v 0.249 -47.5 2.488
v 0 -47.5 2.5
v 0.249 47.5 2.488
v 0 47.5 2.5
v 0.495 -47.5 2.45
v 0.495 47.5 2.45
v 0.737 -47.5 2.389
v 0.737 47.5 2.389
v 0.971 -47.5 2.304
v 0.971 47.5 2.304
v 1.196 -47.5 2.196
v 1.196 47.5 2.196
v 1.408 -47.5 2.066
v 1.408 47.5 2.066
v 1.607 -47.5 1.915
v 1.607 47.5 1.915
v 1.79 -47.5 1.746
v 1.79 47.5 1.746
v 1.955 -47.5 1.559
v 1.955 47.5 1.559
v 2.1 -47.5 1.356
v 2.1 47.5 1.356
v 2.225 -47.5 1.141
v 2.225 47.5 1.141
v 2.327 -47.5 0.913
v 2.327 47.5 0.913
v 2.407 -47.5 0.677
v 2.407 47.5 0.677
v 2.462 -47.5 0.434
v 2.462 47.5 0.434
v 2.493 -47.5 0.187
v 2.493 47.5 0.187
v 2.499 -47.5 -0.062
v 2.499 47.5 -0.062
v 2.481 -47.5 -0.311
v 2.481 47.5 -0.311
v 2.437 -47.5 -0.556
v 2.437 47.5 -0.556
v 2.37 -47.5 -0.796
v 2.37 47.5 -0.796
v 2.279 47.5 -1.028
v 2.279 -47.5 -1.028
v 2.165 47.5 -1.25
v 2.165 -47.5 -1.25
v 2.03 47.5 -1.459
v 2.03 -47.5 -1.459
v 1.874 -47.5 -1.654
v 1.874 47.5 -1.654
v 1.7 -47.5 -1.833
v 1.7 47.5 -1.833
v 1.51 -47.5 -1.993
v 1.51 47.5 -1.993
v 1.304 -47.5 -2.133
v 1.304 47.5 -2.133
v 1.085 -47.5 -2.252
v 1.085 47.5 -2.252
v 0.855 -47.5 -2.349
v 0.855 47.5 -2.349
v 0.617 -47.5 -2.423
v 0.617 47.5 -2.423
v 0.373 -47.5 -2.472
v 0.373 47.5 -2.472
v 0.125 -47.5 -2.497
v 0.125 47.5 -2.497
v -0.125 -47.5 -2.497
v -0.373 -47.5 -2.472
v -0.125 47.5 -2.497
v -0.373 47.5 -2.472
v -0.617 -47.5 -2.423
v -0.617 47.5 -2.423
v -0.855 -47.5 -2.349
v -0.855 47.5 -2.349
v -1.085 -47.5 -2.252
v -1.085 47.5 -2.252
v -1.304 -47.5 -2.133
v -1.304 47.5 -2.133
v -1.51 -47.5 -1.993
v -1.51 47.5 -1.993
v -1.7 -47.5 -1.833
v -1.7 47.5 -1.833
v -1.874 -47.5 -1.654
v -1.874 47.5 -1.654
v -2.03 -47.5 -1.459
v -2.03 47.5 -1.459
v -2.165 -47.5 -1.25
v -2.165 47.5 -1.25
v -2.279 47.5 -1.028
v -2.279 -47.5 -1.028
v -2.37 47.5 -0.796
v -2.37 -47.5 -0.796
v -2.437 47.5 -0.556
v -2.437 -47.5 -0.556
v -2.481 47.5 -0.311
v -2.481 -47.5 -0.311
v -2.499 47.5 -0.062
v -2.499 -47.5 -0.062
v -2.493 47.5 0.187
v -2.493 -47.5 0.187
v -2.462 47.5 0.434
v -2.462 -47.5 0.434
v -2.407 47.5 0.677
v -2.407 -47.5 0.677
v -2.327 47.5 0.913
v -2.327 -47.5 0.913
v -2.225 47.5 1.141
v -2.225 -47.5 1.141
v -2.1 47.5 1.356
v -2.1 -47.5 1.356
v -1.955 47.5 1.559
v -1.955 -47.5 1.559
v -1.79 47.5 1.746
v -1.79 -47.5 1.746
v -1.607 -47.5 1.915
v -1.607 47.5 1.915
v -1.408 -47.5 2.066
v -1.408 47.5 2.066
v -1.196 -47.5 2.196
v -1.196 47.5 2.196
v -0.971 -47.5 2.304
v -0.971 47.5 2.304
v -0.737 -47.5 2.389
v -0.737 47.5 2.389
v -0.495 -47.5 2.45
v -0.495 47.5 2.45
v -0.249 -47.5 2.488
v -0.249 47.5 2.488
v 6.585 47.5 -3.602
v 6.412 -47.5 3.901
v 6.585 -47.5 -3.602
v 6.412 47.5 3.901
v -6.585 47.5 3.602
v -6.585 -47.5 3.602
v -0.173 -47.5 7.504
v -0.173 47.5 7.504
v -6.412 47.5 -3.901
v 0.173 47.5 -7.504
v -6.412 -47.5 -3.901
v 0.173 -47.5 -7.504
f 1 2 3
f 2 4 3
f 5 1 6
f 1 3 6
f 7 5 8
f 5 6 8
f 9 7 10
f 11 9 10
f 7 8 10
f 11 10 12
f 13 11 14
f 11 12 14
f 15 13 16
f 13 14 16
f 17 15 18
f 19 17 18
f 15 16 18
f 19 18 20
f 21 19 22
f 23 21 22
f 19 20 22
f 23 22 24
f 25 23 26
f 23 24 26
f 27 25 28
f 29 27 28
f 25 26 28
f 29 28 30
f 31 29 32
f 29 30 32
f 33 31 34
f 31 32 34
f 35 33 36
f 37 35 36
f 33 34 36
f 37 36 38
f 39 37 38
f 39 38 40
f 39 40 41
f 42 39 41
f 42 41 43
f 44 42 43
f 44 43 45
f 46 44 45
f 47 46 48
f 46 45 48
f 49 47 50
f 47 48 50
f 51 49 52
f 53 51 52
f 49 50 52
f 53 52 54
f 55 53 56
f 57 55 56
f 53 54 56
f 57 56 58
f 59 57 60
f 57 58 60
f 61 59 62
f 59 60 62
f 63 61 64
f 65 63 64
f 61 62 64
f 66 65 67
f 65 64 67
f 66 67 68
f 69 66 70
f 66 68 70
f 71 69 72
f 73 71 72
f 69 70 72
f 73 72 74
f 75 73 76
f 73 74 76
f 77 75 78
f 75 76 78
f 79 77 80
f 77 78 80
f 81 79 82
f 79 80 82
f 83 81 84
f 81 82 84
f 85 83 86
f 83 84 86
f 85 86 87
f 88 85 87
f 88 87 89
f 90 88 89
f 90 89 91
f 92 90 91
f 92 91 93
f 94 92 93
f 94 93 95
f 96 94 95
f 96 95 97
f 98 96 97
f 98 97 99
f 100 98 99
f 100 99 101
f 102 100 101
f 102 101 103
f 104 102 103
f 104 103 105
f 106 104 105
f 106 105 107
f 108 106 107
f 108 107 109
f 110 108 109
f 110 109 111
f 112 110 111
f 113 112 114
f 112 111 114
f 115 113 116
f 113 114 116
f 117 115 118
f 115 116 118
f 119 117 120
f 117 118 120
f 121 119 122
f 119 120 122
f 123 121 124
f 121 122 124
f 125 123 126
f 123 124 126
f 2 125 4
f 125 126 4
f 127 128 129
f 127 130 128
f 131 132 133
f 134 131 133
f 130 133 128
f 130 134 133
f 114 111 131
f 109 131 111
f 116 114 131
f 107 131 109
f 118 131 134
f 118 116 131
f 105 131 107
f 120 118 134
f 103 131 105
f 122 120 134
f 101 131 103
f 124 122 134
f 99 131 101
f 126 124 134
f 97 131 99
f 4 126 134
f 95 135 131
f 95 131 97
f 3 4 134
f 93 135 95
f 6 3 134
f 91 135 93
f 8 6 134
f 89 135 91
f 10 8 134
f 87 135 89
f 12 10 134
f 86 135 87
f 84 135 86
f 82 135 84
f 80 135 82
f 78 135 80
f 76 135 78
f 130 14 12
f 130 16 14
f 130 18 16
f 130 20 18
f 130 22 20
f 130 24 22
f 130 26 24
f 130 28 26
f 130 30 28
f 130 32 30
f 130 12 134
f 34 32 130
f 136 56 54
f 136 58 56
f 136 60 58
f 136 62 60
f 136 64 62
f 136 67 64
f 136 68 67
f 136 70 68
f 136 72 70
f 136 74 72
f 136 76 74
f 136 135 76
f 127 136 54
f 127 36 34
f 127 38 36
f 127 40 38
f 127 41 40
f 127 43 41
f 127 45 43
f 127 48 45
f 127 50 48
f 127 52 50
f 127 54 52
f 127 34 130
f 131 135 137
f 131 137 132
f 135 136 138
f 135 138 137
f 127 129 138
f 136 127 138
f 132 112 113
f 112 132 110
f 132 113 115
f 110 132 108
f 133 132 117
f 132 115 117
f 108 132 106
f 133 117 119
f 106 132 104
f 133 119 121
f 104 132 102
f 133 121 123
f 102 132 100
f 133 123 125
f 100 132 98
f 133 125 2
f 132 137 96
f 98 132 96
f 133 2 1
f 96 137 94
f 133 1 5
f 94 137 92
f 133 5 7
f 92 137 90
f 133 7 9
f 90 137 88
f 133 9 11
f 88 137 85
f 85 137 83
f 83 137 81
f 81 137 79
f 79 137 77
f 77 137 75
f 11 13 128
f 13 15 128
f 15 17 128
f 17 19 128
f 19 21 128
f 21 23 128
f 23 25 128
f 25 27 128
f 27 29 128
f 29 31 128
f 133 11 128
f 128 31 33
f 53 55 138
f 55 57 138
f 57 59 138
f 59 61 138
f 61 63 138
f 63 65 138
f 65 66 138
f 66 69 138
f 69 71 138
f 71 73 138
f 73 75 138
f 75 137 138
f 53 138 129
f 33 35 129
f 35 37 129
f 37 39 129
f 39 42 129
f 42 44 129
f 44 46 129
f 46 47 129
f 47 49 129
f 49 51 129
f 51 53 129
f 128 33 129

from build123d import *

# Parameters (mm, degrees)
BOSS_EXTRUDE1_DEPTH = 47.5
SKETCH1_3_R         = 2.5
CUT_EXTRUDE1_DEPTH  = 52


with BuildPart() as part:
    # Sketch1 → Boss-Extrude1 (new, symmetric)
    with BuildSketch(Plane(origin=(0, 0, 0), x_dir=(1, 0, 0), z_dir=(0, 1, 0))):
        Polygon((6.584646409, 3.602188918), (0.172736092, 7.503565524), (-6.411910317, 3.901376606), (-6.584646409, -3.602188918), (-0.172736092, -7.503565524), (6.411910317, -3.901376606), align=None)
    extrude(amount=BOSS_EXTRUDE1_DEPTH, both=True)

    # Sketch1<3> → Cut-Extrude1 (cut, symmetric)
    with BuildSketch(Plane(origin=(0, 0, 0), x_dir=(1, 0, 0), z_dir=(0, 1, 0))):
        Circle(SKETCH1_3_R)
    extrude(amount=CUT_EXTRUDE1_DEPTH, both=True, mode=Mode.SUBTRACT)


solid = part.part
